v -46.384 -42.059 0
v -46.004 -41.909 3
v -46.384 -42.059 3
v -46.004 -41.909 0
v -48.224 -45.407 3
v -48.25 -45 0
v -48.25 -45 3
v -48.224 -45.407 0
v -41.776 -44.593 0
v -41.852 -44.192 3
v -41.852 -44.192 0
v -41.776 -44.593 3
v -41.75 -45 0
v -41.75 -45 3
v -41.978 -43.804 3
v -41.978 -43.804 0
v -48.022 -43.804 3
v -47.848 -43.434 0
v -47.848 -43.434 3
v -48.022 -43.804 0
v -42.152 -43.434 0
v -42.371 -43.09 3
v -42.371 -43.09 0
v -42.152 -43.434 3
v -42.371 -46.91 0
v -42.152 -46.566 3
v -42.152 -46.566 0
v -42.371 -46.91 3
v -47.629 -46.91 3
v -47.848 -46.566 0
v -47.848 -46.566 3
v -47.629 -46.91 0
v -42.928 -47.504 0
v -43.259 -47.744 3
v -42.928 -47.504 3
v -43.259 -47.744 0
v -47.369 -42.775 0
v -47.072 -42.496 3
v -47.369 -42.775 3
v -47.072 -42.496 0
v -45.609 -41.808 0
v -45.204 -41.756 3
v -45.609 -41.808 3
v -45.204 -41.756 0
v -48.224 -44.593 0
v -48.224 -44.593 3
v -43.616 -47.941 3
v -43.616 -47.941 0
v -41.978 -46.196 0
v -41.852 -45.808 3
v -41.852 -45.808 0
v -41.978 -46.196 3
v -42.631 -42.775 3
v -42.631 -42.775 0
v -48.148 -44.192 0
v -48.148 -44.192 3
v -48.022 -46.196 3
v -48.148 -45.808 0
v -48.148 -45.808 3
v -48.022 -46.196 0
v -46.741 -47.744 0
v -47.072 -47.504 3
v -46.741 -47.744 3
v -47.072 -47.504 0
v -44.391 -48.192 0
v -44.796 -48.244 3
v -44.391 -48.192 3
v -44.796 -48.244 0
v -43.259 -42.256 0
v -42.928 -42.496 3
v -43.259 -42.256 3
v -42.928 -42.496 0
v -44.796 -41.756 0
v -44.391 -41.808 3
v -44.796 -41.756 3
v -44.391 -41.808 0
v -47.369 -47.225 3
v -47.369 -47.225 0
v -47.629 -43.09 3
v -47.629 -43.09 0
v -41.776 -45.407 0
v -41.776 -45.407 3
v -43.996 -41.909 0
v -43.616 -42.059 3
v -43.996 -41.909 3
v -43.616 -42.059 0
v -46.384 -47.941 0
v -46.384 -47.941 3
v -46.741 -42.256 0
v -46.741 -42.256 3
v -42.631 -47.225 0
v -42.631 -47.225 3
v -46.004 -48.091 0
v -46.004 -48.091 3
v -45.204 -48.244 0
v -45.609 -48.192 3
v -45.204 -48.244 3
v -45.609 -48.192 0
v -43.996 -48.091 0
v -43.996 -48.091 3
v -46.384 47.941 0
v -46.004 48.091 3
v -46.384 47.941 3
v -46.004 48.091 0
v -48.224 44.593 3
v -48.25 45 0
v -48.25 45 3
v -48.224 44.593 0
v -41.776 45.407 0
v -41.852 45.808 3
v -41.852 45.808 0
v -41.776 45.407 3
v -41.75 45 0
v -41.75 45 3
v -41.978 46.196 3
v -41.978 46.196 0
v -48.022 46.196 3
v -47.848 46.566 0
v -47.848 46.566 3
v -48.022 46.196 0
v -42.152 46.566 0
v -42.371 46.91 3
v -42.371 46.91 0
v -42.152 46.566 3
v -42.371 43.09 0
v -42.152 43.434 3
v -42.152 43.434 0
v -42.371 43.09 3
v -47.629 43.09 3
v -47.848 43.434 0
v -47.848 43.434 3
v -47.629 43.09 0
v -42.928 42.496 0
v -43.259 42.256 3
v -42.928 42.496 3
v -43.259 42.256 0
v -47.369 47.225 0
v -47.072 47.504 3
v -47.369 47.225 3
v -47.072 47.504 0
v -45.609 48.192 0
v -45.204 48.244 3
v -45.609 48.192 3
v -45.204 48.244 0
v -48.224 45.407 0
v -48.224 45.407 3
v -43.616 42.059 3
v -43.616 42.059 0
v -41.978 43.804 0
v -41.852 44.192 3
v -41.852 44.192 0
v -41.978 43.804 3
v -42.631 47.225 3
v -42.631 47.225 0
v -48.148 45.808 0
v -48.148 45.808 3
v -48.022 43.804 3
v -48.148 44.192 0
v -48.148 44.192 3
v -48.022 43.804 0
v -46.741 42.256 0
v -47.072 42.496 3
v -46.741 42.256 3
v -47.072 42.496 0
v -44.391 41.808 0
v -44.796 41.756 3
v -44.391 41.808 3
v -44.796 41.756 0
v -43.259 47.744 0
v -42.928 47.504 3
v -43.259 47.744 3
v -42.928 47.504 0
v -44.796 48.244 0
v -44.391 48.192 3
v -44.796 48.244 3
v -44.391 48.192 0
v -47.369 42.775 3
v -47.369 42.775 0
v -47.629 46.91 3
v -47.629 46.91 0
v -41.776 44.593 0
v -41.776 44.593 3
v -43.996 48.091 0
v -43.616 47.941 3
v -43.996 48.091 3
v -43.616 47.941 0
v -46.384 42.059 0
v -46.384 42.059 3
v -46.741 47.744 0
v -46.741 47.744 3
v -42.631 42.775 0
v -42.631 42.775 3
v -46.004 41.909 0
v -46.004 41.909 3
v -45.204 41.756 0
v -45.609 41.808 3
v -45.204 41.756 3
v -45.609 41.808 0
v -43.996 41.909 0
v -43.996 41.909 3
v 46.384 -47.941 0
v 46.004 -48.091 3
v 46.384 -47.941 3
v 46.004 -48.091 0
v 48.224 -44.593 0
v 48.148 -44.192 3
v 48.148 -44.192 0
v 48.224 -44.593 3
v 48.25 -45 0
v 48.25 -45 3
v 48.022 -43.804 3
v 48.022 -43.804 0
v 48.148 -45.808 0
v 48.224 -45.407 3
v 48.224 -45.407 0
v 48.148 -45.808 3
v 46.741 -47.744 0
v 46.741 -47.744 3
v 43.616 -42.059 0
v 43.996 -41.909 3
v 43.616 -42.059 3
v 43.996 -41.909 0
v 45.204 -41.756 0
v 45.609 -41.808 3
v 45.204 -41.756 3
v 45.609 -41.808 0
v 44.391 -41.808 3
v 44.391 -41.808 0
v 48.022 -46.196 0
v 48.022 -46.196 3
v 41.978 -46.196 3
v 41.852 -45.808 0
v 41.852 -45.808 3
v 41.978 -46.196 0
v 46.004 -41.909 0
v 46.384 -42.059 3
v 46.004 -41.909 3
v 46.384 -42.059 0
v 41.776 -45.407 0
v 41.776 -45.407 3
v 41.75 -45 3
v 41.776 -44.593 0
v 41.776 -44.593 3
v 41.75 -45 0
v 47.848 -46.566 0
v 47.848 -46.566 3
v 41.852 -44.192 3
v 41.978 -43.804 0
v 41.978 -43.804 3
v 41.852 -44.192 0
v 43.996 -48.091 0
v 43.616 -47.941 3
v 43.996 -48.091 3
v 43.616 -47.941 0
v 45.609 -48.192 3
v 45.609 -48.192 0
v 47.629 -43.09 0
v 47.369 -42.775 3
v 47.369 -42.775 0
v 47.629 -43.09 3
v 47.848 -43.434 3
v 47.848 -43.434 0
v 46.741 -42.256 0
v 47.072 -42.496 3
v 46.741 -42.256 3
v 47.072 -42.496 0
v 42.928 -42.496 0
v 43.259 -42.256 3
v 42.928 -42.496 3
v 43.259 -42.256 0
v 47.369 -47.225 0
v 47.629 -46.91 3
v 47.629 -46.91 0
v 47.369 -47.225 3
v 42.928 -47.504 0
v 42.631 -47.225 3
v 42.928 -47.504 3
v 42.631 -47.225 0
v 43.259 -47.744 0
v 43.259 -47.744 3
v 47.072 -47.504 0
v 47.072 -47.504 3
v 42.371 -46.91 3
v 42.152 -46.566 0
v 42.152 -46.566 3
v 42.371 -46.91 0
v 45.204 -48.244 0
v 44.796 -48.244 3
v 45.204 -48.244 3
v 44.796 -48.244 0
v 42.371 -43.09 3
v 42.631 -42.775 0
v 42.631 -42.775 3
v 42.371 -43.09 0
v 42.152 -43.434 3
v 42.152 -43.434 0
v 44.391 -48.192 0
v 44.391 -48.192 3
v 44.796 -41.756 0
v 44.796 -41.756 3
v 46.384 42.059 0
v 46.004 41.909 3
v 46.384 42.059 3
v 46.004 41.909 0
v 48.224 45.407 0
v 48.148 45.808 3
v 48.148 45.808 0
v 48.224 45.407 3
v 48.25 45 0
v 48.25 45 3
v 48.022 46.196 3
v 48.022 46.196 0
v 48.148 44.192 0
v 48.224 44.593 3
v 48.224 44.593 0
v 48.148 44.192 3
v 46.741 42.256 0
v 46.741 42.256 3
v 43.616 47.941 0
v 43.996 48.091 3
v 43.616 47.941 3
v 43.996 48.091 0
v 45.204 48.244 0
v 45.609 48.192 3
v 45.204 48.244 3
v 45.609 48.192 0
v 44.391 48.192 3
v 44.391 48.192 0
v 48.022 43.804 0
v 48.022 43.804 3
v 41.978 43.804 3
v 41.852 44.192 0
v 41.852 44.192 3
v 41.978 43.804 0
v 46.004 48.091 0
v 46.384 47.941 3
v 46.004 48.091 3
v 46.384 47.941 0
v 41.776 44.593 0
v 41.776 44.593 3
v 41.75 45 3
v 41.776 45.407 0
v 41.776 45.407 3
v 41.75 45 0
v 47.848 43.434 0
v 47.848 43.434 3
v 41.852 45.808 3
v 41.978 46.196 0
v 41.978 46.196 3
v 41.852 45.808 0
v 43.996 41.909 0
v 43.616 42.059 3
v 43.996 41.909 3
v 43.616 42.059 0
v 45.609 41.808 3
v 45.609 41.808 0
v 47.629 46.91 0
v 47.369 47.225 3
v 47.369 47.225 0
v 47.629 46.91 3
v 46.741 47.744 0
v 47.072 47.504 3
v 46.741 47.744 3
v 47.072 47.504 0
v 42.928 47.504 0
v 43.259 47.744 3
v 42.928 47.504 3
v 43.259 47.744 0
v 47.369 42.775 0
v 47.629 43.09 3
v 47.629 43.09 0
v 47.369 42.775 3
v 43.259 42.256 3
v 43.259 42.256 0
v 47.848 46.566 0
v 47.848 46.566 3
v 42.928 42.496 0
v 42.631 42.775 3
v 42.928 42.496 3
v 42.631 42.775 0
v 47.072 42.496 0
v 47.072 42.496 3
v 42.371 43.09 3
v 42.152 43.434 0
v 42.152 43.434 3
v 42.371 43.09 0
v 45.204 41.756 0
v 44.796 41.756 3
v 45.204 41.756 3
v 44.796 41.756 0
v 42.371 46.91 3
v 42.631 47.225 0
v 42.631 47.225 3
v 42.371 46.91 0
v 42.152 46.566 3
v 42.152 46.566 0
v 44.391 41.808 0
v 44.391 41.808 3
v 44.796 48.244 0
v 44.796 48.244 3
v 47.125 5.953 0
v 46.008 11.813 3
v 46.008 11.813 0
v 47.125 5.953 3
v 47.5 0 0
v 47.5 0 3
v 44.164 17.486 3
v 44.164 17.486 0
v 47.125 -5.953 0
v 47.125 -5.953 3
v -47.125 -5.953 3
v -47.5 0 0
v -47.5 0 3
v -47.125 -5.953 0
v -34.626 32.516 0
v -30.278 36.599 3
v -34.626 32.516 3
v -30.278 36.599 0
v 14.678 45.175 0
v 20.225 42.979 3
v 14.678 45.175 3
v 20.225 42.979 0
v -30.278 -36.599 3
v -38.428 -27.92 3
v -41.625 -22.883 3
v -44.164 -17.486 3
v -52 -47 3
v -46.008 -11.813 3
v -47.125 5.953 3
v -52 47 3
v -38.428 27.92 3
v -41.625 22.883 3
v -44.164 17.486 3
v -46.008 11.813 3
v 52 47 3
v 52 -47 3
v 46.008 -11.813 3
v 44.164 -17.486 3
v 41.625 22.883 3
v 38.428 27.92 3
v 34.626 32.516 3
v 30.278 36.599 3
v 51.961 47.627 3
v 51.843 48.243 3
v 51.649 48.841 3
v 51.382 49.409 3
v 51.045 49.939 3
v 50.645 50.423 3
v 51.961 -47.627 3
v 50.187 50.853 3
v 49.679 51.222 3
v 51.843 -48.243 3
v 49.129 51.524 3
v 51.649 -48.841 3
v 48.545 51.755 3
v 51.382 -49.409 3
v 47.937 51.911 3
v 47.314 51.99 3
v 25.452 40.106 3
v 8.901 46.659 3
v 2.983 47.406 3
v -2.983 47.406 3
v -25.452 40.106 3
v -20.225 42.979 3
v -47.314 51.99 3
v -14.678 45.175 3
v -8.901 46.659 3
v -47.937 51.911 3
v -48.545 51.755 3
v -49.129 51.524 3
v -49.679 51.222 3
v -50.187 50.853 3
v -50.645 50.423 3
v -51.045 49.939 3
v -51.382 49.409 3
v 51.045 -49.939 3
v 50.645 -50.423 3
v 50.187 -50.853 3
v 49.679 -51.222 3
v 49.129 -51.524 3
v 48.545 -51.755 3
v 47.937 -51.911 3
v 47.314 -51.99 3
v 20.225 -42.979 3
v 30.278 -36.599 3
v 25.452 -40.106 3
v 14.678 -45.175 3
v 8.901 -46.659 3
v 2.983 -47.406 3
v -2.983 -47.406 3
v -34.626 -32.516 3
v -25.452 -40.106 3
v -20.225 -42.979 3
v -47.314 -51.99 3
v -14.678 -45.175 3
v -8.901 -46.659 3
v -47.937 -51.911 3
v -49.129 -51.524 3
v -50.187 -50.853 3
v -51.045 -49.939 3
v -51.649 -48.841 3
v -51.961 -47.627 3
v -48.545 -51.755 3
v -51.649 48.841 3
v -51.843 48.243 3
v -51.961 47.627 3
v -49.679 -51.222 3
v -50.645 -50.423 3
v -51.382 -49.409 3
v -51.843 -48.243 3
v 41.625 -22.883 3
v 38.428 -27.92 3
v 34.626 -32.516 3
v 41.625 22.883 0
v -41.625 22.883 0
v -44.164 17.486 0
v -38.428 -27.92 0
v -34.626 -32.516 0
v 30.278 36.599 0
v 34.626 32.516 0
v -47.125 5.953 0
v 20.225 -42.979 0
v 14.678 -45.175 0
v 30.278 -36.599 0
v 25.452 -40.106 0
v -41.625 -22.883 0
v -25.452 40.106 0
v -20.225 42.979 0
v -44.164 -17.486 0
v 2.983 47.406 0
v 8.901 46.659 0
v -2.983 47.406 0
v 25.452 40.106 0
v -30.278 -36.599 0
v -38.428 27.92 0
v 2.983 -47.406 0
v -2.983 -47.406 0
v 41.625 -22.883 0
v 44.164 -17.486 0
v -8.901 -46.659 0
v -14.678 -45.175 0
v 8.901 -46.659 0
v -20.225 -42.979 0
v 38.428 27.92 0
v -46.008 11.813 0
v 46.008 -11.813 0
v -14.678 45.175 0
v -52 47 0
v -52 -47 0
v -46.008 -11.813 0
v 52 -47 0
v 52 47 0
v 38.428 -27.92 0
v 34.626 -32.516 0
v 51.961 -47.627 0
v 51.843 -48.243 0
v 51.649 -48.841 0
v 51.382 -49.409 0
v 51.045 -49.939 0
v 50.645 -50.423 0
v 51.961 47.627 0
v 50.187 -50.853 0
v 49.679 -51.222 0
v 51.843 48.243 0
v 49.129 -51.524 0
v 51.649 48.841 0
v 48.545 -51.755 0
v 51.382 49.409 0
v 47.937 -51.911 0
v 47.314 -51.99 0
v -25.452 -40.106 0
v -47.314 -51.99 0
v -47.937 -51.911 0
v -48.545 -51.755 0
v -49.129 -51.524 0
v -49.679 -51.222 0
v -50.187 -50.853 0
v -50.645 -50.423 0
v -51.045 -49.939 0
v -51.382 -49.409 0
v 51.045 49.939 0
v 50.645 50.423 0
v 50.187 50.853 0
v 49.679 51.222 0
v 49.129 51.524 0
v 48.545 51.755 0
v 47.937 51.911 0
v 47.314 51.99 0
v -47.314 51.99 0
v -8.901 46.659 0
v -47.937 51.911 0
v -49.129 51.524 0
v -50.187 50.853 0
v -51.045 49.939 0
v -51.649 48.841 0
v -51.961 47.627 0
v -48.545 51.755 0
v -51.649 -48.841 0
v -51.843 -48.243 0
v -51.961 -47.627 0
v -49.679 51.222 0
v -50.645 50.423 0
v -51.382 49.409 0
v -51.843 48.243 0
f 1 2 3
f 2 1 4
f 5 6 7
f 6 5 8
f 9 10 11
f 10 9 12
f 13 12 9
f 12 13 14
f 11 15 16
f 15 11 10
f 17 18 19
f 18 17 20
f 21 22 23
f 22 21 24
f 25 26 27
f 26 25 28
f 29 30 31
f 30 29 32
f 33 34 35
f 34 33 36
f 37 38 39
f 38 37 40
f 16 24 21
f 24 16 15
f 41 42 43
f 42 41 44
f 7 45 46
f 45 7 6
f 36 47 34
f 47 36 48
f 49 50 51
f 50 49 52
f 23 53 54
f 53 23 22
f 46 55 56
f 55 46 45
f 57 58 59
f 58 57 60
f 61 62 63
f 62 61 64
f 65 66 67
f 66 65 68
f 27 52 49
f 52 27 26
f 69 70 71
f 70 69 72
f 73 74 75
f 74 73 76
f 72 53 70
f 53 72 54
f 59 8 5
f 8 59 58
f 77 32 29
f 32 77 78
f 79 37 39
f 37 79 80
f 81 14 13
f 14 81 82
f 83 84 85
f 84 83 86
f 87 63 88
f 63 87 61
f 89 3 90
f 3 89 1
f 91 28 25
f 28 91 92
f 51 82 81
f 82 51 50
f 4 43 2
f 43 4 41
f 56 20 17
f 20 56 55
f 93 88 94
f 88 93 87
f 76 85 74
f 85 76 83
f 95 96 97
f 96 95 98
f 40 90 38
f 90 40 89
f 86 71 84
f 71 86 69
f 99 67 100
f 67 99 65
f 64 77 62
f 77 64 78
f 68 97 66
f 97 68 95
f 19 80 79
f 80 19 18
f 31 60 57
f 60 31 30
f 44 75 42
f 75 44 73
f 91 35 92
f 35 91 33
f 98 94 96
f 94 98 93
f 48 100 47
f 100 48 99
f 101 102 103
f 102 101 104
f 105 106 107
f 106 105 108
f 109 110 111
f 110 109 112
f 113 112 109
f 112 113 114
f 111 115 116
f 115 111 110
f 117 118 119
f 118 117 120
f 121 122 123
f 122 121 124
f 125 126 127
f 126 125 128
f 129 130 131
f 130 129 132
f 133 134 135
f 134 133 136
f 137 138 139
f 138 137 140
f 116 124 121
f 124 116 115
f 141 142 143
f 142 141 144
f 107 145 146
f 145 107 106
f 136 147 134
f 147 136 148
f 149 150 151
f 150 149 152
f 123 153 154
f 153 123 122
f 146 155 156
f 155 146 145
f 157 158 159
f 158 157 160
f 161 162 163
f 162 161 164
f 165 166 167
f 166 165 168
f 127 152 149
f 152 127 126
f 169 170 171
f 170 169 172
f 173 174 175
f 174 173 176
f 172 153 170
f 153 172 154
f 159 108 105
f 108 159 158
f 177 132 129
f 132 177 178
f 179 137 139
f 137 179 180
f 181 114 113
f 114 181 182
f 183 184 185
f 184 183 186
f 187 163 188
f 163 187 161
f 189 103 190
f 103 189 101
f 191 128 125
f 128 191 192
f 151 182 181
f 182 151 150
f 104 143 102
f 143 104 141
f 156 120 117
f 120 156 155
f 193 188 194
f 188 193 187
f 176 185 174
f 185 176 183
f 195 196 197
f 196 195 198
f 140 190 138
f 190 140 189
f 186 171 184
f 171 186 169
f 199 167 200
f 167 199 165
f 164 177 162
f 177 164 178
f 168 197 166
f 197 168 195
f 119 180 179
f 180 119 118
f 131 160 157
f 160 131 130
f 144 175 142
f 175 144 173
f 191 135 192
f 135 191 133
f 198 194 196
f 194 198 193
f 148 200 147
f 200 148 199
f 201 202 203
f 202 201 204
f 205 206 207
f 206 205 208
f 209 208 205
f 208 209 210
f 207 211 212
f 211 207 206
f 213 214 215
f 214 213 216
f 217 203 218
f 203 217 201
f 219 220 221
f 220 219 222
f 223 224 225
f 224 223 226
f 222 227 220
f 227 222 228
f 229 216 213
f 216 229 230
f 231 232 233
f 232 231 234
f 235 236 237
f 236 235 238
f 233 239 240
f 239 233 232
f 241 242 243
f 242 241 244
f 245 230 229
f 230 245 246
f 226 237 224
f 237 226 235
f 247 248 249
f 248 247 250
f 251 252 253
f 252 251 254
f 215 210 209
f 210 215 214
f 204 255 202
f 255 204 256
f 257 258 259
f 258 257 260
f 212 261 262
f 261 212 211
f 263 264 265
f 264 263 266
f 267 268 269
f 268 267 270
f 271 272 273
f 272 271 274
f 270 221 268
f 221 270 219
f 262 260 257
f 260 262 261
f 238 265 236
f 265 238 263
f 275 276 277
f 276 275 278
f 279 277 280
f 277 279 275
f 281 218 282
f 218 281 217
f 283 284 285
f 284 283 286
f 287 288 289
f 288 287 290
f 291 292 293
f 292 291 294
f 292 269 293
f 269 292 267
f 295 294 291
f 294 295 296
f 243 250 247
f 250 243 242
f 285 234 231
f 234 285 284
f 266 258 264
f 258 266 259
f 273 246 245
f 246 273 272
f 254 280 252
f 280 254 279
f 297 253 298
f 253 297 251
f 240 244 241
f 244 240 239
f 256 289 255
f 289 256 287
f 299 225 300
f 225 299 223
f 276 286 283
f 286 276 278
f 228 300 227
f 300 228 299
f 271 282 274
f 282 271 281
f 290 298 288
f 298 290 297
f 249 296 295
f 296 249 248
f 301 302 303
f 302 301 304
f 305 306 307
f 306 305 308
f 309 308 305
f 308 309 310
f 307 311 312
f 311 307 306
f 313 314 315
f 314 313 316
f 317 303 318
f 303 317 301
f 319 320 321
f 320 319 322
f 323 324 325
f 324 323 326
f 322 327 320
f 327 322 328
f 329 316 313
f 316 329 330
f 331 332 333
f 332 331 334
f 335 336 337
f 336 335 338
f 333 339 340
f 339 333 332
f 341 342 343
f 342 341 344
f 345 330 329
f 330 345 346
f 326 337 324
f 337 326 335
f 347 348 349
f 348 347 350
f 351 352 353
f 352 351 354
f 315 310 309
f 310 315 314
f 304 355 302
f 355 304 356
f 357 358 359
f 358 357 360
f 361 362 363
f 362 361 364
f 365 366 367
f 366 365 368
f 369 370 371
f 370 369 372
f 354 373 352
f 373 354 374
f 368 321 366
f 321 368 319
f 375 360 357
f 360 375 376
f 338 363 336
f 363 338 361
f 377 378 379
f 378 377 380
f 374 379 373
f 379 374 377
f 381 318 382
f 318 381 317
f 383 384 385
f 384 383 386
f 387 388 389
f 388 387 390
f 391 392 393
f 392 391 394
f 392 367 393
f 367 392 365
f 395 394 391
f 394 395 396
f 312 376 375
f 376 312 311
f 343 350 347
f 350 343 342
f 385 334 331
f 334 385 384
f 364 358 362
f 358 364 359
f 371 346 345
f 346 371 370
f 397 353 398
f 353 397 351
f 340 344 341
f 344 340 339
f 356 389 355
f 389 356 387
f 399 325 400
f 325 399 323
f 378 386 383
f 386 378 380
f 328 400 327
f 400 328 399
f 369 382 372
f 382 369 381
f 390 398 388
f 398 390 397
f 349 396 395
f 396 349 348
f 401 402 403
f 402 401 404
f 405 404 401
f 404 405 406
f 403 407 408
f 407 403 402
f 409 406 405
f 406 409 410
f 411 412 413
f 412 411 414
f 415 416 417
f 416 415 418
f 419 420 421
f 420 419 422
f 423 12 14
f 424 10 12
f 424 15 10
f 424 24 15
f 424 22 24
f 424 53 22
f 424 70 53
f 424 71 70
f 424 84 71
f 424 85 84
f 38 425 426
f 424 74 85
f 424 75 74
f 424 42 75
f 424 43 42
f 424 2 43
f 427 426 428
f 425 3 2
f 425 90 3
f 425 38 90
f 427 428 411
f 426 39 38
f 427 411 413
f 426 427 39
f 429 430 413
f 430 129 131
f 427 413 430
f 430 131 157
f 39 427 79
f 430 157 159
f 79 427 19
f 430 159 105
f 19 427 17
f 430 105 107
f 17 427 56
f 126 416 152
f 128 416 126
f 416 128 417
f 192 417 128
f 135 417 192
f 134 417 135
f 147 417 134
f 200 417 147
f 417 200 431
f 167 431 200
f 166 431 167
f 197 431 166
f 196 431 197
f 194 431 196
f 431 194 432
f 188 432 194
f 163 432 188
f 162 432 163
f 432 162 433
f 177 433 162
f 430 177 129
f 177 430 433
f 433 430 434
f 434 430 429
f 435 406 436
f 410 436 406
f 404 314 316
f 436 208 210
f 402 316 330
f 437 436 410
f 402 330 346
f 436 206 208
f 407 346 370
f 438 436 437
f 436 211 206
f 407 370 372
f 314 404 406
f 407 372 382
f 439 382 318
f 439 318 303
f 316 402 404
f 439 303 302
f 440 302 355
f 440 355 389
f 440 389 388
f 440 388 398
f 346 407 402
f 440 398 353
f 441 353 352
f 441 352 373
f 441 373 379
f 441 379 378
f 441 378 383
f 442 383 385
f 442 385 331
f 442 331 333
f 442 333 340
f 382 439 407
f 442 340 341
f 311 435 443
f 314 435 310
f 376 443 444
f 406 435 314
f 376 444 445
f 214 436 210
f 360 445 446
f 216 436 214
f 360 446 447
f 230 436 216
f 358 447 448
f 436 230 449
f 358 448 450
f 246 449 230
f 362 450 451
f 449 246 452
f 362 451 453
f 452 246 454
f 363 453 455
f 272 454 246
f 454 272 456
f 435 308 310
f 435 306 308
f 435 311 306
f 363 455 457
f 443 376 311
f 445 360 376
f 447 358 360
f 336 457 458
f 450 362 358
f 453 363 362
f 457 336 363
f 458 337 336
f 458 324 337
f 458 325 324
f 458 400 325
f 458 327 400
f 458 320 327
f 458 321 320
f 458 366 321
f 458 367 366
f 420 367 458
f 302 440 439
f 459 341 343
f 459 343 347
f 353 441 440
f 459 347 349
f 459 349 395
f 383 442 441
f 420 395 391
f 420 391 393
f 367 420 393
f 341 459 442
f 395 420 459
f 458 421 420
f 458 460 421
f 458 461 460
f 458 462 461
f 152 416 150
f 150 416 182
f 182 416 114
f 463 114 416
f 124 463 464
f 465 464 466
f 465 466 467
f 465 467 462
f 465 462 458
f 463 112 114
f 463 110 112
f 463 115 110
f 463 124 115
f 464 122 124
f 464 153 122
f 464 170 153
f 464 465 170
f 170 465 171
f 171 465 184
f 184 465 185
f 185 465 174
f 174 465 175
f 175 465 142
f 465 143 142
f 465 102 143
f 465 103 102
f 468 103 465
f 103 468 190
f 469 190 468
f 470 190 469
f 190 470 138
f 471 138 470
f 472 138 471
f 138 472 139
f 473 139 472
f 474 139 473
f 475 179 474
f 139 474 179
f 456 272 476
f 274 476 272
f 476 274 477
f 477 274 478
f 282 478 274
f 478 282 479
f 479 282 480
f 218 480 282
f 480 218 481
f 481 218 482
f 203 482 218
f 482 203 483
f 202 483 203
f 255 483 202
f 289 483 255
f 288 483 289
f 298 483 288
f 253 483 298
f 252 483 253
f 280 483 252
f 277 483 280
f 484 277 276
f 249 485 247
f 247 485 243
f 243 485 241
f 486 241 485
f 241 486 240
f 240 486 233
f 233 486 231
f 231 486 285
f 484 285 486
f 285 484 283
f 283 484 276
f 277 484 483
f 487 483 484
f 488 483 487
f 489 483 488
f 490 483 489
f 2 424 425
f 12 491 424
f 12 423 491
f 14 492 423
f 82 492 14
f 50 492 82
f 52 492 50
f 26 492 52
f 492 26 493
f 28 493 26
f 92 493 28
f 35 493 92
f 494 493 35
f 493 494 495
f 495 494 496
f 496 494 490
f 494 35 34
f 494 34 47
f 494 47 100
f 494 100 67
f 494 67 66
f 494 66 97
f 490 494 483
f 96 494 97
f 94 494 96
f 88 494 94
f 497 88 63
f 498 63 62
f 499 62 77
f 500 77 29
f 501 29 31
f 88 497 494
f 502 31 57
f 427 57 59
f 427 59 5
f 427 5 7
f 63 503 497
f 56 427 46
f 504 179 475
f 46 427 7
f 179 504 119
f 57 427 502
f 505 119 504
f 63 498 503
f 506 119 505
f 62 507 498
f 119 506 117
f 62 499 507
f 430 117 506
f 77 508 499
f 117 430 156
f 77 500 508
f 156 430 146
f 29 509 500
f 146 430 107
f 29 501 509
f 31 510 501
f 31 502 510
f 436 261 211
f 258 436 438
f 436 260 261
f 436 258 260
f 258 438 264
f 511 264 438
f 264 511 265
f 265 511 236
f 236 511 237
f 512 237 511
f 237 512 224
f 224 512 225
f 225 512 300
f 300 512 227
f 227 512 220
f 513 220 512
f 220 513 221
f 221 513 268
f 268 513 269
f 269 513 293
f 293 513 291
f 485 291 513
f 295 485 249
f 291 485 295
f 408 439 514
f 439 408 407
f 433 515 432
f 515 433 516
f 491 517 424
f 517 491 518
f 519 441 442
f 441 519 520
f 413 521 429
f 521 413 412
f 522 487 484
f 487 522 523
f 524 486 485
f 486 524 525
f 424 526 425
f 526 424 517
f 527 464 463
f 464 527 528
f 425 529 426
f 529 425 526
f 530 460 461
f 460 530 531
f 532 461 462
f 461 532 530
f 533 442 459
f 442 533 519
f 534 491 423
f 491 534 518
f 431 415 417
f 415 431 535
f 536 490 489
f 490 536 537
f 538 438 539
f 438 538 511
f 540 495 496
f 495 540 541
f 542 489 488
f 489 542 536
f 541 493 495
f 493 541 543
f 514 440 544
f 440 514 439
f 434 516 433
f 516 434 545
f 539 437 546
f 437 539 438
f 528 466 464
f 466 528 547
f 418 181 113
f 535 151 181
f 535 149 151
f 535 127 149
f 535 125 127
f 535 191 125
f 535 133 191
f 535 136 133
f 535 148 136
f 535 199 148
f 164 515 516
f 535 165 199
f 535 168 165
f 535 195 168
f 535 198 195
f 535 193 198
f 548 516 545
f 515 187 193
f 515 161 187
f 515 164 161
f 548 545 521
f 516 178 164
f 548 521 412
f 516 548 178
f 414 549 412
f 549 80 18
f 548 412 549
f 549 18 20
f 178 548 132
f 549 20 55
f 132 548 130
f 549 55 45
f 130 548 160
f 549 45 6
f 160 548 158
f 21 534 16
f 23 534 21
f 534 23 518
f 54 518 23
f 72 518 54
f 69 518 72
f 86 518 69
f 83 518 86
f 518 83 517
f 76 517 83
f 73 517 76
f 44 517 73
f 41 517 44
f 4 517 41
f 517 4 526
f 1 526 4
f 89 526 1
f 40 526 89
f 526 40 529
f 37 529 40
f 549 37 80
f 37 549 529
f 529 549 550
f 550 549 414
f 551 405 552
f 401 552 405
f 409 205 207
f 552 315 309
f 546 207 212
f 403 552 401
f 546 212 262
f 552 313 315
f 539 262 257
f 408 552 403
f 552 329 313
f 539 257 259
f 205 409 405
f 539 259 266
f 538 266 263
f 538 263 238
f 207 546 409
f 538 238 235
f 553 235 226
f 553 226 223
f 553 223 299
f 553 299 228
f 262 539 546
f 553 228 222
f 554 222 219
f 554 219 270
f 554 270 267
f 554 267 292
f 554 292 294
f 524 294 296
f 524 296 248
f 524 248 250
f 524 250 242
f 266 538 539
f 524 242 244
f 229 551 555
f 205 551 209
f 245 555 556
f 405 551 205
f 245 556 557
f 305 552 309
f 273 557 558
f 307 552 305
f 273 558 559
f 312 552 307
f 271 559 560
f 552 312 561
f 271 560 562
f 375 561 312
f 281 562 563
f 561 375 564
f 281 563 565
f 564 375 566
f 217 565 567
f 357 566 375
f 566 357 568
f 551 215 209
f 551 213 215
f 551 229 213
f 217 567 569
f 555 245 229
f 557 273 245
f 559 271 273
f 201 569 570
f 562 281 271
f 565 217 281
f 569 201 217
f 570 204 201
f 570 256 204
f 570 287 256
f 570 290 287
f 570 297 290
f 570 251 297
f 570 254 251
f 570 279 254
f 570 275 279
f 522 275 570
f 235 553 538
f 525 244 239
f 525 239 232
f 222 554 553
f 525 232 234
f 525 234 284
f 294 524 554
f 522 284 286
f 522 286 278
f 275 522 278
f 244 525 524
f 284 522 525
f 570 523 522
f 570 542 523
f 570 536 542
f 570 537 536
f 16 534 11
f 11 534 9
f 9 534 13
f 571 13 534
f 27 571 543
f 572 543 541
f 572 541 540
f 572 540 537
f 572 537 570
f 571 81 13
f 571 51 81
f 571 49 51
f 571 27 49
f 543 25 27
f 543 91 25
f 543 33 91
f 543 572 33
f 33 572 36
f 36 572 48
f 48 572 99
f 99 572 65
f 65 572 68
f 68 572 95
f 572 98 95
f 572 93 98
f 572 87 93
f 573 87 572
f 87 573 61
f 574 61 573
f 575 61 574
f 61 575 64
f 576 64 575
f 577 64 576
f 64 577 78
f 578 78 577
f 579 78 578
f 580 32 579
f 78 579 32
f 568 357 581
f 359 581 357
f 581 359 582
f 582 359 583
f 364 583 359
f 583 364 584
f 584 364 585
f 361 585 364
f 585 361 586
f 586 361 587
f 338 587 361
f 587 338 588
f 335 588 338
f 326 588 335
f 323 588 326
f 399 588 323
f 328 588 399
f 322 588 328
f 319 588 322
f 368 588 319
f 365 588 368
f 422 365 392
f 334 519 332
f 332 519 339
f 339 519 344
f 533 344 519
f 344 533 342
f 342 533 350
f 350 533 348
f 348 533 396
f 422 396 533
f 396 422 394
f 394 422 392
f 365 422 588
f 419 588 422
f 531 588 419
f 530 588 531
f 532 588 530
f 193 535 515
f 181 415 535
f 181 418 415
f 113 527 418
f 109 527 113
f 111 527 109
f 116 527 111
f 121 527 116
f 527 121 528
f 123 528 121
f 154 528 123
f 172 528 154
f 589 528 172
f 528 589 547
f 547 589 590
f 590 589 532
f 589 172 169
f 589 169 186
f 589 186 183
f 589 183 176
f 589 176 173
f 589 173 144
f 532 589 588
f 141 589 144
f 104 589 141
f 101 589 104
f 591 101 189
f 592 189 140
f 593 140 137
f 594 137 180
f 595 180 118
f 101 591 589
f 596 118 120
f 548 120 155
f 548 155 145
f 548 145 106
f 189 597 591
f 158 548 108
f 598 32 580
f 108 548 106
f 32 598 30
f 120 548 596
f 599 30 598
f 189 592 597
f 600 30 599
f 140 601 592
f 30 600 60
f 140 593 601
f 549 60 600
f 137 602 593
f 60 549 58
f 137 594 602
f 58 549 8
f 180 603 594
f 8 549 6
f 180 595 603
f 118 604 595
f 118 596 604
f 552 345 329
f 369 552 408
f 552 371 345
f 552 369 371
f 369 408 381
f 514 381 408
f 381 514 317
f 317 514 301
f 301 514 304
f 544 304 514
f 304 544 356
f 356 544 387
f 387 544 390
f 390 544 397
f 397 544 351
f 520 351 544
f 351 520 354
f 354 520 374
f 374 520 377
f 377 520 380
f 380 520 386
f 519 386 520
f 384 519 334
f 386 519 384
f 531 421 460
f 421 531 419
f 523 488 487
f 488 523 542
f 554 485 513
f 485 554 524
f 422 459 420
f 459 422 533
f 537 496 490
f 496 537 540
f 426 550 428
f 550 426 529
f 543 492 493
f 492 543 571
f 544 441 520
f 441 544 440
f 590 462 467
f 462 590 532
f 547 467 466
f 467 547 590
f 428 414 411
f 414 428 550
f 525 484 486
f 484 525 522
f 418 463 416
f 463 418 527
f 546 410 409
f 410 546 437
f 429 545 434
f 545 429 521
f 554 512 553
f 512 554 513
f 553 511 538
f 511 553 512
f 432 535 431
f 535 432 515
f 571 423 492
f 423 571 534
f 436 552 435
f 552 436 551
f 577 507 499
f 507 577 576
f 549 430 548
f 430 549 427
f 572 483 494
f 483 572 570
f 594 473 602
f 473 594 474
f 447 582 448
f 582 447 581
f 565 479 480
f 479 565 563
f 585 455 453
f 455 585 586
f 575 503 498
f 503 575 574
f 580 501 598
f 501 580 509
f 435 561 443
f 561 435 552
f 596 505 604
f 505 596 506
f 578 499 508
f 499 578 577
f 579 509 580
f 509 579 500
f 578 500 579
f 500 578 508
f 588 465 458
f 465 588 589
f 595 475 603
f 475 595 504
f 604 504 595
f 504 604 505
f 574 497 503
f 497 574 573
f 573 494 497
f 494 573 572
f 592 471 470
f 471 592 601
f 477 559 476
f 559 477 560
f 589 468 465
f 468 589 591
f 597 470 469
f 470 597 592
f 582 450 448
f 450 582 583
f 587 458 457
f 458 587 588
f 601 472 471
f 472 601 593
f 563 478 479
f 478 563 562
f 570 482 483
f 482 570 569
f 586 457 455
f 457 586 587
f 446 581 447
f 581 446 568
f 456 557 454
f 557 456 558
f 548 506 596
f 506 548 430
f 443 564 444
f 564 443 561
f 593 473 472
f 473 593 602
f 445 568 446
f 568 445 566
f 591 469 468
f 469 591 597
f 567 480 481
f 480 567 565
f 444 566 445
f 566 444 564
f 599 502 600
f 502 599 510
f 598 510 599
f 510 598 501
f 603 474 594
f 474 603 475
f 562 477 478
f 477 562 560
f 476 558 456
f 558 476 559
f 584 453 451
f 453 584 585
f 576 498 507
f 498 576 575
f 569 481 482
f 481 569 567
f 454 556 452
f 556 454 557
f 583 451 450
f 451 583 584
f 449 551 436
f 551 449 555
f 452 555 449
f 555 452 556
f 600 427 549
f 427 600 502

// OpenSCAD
$fn = 50;

difference() {
	union() {
		hull() {
			translate(v = [-47.0, 47.0, 0]) {
				cylinder(h = 3, r = 5);
			}
			translate(v = [47.0, 47.0, 0]) {
				cylinder(h = 3, r = 5);
			}
			translate(v = [-47.0, -47.0, 0]) {
				cylinder(h = 3, r = 5);
			}
			translate(v = [47.0, -47.0, 0]) {
				cylinder(h = 3, r = 5);
			}
		}
	}
	union() {
		translate(v = [-45.0, -45.0, -100.0]) {
			cylinder(h = 200, r = 3.25);
		}
		translate(v = [-45.0, 45.0, -100.0]) {
			cylinder(h = 200, r = 3.25);
		}
		translate(v = [45.0, -45.0, -100.0]) {
			cylinder(h = 200, r = 3.25);
		}
		translate(v = [45.0, 45.0, -100.0]) {
			cylinder(h = 200, r = 3.25);
		}
		translate(v = [-45.0, -45.0, -100.0]) {
			cylinder(h = 200, r = 1.8);
		}
		translate(v = [-45.0, 45.0, -100.0]) {
			cylinder(h = 200, r = 1.8);
		}
		translate(v = [45.0, -45.0, -100.0]) {
			cylinder(h = 200, r = 1.8);
		}
		translate(v = [45.0, 45.0, -100.0]) {
			cylinder(h = 200, r = 1.8);
		}
		cylinder(h = 3, r = 47.5);
	}
}
